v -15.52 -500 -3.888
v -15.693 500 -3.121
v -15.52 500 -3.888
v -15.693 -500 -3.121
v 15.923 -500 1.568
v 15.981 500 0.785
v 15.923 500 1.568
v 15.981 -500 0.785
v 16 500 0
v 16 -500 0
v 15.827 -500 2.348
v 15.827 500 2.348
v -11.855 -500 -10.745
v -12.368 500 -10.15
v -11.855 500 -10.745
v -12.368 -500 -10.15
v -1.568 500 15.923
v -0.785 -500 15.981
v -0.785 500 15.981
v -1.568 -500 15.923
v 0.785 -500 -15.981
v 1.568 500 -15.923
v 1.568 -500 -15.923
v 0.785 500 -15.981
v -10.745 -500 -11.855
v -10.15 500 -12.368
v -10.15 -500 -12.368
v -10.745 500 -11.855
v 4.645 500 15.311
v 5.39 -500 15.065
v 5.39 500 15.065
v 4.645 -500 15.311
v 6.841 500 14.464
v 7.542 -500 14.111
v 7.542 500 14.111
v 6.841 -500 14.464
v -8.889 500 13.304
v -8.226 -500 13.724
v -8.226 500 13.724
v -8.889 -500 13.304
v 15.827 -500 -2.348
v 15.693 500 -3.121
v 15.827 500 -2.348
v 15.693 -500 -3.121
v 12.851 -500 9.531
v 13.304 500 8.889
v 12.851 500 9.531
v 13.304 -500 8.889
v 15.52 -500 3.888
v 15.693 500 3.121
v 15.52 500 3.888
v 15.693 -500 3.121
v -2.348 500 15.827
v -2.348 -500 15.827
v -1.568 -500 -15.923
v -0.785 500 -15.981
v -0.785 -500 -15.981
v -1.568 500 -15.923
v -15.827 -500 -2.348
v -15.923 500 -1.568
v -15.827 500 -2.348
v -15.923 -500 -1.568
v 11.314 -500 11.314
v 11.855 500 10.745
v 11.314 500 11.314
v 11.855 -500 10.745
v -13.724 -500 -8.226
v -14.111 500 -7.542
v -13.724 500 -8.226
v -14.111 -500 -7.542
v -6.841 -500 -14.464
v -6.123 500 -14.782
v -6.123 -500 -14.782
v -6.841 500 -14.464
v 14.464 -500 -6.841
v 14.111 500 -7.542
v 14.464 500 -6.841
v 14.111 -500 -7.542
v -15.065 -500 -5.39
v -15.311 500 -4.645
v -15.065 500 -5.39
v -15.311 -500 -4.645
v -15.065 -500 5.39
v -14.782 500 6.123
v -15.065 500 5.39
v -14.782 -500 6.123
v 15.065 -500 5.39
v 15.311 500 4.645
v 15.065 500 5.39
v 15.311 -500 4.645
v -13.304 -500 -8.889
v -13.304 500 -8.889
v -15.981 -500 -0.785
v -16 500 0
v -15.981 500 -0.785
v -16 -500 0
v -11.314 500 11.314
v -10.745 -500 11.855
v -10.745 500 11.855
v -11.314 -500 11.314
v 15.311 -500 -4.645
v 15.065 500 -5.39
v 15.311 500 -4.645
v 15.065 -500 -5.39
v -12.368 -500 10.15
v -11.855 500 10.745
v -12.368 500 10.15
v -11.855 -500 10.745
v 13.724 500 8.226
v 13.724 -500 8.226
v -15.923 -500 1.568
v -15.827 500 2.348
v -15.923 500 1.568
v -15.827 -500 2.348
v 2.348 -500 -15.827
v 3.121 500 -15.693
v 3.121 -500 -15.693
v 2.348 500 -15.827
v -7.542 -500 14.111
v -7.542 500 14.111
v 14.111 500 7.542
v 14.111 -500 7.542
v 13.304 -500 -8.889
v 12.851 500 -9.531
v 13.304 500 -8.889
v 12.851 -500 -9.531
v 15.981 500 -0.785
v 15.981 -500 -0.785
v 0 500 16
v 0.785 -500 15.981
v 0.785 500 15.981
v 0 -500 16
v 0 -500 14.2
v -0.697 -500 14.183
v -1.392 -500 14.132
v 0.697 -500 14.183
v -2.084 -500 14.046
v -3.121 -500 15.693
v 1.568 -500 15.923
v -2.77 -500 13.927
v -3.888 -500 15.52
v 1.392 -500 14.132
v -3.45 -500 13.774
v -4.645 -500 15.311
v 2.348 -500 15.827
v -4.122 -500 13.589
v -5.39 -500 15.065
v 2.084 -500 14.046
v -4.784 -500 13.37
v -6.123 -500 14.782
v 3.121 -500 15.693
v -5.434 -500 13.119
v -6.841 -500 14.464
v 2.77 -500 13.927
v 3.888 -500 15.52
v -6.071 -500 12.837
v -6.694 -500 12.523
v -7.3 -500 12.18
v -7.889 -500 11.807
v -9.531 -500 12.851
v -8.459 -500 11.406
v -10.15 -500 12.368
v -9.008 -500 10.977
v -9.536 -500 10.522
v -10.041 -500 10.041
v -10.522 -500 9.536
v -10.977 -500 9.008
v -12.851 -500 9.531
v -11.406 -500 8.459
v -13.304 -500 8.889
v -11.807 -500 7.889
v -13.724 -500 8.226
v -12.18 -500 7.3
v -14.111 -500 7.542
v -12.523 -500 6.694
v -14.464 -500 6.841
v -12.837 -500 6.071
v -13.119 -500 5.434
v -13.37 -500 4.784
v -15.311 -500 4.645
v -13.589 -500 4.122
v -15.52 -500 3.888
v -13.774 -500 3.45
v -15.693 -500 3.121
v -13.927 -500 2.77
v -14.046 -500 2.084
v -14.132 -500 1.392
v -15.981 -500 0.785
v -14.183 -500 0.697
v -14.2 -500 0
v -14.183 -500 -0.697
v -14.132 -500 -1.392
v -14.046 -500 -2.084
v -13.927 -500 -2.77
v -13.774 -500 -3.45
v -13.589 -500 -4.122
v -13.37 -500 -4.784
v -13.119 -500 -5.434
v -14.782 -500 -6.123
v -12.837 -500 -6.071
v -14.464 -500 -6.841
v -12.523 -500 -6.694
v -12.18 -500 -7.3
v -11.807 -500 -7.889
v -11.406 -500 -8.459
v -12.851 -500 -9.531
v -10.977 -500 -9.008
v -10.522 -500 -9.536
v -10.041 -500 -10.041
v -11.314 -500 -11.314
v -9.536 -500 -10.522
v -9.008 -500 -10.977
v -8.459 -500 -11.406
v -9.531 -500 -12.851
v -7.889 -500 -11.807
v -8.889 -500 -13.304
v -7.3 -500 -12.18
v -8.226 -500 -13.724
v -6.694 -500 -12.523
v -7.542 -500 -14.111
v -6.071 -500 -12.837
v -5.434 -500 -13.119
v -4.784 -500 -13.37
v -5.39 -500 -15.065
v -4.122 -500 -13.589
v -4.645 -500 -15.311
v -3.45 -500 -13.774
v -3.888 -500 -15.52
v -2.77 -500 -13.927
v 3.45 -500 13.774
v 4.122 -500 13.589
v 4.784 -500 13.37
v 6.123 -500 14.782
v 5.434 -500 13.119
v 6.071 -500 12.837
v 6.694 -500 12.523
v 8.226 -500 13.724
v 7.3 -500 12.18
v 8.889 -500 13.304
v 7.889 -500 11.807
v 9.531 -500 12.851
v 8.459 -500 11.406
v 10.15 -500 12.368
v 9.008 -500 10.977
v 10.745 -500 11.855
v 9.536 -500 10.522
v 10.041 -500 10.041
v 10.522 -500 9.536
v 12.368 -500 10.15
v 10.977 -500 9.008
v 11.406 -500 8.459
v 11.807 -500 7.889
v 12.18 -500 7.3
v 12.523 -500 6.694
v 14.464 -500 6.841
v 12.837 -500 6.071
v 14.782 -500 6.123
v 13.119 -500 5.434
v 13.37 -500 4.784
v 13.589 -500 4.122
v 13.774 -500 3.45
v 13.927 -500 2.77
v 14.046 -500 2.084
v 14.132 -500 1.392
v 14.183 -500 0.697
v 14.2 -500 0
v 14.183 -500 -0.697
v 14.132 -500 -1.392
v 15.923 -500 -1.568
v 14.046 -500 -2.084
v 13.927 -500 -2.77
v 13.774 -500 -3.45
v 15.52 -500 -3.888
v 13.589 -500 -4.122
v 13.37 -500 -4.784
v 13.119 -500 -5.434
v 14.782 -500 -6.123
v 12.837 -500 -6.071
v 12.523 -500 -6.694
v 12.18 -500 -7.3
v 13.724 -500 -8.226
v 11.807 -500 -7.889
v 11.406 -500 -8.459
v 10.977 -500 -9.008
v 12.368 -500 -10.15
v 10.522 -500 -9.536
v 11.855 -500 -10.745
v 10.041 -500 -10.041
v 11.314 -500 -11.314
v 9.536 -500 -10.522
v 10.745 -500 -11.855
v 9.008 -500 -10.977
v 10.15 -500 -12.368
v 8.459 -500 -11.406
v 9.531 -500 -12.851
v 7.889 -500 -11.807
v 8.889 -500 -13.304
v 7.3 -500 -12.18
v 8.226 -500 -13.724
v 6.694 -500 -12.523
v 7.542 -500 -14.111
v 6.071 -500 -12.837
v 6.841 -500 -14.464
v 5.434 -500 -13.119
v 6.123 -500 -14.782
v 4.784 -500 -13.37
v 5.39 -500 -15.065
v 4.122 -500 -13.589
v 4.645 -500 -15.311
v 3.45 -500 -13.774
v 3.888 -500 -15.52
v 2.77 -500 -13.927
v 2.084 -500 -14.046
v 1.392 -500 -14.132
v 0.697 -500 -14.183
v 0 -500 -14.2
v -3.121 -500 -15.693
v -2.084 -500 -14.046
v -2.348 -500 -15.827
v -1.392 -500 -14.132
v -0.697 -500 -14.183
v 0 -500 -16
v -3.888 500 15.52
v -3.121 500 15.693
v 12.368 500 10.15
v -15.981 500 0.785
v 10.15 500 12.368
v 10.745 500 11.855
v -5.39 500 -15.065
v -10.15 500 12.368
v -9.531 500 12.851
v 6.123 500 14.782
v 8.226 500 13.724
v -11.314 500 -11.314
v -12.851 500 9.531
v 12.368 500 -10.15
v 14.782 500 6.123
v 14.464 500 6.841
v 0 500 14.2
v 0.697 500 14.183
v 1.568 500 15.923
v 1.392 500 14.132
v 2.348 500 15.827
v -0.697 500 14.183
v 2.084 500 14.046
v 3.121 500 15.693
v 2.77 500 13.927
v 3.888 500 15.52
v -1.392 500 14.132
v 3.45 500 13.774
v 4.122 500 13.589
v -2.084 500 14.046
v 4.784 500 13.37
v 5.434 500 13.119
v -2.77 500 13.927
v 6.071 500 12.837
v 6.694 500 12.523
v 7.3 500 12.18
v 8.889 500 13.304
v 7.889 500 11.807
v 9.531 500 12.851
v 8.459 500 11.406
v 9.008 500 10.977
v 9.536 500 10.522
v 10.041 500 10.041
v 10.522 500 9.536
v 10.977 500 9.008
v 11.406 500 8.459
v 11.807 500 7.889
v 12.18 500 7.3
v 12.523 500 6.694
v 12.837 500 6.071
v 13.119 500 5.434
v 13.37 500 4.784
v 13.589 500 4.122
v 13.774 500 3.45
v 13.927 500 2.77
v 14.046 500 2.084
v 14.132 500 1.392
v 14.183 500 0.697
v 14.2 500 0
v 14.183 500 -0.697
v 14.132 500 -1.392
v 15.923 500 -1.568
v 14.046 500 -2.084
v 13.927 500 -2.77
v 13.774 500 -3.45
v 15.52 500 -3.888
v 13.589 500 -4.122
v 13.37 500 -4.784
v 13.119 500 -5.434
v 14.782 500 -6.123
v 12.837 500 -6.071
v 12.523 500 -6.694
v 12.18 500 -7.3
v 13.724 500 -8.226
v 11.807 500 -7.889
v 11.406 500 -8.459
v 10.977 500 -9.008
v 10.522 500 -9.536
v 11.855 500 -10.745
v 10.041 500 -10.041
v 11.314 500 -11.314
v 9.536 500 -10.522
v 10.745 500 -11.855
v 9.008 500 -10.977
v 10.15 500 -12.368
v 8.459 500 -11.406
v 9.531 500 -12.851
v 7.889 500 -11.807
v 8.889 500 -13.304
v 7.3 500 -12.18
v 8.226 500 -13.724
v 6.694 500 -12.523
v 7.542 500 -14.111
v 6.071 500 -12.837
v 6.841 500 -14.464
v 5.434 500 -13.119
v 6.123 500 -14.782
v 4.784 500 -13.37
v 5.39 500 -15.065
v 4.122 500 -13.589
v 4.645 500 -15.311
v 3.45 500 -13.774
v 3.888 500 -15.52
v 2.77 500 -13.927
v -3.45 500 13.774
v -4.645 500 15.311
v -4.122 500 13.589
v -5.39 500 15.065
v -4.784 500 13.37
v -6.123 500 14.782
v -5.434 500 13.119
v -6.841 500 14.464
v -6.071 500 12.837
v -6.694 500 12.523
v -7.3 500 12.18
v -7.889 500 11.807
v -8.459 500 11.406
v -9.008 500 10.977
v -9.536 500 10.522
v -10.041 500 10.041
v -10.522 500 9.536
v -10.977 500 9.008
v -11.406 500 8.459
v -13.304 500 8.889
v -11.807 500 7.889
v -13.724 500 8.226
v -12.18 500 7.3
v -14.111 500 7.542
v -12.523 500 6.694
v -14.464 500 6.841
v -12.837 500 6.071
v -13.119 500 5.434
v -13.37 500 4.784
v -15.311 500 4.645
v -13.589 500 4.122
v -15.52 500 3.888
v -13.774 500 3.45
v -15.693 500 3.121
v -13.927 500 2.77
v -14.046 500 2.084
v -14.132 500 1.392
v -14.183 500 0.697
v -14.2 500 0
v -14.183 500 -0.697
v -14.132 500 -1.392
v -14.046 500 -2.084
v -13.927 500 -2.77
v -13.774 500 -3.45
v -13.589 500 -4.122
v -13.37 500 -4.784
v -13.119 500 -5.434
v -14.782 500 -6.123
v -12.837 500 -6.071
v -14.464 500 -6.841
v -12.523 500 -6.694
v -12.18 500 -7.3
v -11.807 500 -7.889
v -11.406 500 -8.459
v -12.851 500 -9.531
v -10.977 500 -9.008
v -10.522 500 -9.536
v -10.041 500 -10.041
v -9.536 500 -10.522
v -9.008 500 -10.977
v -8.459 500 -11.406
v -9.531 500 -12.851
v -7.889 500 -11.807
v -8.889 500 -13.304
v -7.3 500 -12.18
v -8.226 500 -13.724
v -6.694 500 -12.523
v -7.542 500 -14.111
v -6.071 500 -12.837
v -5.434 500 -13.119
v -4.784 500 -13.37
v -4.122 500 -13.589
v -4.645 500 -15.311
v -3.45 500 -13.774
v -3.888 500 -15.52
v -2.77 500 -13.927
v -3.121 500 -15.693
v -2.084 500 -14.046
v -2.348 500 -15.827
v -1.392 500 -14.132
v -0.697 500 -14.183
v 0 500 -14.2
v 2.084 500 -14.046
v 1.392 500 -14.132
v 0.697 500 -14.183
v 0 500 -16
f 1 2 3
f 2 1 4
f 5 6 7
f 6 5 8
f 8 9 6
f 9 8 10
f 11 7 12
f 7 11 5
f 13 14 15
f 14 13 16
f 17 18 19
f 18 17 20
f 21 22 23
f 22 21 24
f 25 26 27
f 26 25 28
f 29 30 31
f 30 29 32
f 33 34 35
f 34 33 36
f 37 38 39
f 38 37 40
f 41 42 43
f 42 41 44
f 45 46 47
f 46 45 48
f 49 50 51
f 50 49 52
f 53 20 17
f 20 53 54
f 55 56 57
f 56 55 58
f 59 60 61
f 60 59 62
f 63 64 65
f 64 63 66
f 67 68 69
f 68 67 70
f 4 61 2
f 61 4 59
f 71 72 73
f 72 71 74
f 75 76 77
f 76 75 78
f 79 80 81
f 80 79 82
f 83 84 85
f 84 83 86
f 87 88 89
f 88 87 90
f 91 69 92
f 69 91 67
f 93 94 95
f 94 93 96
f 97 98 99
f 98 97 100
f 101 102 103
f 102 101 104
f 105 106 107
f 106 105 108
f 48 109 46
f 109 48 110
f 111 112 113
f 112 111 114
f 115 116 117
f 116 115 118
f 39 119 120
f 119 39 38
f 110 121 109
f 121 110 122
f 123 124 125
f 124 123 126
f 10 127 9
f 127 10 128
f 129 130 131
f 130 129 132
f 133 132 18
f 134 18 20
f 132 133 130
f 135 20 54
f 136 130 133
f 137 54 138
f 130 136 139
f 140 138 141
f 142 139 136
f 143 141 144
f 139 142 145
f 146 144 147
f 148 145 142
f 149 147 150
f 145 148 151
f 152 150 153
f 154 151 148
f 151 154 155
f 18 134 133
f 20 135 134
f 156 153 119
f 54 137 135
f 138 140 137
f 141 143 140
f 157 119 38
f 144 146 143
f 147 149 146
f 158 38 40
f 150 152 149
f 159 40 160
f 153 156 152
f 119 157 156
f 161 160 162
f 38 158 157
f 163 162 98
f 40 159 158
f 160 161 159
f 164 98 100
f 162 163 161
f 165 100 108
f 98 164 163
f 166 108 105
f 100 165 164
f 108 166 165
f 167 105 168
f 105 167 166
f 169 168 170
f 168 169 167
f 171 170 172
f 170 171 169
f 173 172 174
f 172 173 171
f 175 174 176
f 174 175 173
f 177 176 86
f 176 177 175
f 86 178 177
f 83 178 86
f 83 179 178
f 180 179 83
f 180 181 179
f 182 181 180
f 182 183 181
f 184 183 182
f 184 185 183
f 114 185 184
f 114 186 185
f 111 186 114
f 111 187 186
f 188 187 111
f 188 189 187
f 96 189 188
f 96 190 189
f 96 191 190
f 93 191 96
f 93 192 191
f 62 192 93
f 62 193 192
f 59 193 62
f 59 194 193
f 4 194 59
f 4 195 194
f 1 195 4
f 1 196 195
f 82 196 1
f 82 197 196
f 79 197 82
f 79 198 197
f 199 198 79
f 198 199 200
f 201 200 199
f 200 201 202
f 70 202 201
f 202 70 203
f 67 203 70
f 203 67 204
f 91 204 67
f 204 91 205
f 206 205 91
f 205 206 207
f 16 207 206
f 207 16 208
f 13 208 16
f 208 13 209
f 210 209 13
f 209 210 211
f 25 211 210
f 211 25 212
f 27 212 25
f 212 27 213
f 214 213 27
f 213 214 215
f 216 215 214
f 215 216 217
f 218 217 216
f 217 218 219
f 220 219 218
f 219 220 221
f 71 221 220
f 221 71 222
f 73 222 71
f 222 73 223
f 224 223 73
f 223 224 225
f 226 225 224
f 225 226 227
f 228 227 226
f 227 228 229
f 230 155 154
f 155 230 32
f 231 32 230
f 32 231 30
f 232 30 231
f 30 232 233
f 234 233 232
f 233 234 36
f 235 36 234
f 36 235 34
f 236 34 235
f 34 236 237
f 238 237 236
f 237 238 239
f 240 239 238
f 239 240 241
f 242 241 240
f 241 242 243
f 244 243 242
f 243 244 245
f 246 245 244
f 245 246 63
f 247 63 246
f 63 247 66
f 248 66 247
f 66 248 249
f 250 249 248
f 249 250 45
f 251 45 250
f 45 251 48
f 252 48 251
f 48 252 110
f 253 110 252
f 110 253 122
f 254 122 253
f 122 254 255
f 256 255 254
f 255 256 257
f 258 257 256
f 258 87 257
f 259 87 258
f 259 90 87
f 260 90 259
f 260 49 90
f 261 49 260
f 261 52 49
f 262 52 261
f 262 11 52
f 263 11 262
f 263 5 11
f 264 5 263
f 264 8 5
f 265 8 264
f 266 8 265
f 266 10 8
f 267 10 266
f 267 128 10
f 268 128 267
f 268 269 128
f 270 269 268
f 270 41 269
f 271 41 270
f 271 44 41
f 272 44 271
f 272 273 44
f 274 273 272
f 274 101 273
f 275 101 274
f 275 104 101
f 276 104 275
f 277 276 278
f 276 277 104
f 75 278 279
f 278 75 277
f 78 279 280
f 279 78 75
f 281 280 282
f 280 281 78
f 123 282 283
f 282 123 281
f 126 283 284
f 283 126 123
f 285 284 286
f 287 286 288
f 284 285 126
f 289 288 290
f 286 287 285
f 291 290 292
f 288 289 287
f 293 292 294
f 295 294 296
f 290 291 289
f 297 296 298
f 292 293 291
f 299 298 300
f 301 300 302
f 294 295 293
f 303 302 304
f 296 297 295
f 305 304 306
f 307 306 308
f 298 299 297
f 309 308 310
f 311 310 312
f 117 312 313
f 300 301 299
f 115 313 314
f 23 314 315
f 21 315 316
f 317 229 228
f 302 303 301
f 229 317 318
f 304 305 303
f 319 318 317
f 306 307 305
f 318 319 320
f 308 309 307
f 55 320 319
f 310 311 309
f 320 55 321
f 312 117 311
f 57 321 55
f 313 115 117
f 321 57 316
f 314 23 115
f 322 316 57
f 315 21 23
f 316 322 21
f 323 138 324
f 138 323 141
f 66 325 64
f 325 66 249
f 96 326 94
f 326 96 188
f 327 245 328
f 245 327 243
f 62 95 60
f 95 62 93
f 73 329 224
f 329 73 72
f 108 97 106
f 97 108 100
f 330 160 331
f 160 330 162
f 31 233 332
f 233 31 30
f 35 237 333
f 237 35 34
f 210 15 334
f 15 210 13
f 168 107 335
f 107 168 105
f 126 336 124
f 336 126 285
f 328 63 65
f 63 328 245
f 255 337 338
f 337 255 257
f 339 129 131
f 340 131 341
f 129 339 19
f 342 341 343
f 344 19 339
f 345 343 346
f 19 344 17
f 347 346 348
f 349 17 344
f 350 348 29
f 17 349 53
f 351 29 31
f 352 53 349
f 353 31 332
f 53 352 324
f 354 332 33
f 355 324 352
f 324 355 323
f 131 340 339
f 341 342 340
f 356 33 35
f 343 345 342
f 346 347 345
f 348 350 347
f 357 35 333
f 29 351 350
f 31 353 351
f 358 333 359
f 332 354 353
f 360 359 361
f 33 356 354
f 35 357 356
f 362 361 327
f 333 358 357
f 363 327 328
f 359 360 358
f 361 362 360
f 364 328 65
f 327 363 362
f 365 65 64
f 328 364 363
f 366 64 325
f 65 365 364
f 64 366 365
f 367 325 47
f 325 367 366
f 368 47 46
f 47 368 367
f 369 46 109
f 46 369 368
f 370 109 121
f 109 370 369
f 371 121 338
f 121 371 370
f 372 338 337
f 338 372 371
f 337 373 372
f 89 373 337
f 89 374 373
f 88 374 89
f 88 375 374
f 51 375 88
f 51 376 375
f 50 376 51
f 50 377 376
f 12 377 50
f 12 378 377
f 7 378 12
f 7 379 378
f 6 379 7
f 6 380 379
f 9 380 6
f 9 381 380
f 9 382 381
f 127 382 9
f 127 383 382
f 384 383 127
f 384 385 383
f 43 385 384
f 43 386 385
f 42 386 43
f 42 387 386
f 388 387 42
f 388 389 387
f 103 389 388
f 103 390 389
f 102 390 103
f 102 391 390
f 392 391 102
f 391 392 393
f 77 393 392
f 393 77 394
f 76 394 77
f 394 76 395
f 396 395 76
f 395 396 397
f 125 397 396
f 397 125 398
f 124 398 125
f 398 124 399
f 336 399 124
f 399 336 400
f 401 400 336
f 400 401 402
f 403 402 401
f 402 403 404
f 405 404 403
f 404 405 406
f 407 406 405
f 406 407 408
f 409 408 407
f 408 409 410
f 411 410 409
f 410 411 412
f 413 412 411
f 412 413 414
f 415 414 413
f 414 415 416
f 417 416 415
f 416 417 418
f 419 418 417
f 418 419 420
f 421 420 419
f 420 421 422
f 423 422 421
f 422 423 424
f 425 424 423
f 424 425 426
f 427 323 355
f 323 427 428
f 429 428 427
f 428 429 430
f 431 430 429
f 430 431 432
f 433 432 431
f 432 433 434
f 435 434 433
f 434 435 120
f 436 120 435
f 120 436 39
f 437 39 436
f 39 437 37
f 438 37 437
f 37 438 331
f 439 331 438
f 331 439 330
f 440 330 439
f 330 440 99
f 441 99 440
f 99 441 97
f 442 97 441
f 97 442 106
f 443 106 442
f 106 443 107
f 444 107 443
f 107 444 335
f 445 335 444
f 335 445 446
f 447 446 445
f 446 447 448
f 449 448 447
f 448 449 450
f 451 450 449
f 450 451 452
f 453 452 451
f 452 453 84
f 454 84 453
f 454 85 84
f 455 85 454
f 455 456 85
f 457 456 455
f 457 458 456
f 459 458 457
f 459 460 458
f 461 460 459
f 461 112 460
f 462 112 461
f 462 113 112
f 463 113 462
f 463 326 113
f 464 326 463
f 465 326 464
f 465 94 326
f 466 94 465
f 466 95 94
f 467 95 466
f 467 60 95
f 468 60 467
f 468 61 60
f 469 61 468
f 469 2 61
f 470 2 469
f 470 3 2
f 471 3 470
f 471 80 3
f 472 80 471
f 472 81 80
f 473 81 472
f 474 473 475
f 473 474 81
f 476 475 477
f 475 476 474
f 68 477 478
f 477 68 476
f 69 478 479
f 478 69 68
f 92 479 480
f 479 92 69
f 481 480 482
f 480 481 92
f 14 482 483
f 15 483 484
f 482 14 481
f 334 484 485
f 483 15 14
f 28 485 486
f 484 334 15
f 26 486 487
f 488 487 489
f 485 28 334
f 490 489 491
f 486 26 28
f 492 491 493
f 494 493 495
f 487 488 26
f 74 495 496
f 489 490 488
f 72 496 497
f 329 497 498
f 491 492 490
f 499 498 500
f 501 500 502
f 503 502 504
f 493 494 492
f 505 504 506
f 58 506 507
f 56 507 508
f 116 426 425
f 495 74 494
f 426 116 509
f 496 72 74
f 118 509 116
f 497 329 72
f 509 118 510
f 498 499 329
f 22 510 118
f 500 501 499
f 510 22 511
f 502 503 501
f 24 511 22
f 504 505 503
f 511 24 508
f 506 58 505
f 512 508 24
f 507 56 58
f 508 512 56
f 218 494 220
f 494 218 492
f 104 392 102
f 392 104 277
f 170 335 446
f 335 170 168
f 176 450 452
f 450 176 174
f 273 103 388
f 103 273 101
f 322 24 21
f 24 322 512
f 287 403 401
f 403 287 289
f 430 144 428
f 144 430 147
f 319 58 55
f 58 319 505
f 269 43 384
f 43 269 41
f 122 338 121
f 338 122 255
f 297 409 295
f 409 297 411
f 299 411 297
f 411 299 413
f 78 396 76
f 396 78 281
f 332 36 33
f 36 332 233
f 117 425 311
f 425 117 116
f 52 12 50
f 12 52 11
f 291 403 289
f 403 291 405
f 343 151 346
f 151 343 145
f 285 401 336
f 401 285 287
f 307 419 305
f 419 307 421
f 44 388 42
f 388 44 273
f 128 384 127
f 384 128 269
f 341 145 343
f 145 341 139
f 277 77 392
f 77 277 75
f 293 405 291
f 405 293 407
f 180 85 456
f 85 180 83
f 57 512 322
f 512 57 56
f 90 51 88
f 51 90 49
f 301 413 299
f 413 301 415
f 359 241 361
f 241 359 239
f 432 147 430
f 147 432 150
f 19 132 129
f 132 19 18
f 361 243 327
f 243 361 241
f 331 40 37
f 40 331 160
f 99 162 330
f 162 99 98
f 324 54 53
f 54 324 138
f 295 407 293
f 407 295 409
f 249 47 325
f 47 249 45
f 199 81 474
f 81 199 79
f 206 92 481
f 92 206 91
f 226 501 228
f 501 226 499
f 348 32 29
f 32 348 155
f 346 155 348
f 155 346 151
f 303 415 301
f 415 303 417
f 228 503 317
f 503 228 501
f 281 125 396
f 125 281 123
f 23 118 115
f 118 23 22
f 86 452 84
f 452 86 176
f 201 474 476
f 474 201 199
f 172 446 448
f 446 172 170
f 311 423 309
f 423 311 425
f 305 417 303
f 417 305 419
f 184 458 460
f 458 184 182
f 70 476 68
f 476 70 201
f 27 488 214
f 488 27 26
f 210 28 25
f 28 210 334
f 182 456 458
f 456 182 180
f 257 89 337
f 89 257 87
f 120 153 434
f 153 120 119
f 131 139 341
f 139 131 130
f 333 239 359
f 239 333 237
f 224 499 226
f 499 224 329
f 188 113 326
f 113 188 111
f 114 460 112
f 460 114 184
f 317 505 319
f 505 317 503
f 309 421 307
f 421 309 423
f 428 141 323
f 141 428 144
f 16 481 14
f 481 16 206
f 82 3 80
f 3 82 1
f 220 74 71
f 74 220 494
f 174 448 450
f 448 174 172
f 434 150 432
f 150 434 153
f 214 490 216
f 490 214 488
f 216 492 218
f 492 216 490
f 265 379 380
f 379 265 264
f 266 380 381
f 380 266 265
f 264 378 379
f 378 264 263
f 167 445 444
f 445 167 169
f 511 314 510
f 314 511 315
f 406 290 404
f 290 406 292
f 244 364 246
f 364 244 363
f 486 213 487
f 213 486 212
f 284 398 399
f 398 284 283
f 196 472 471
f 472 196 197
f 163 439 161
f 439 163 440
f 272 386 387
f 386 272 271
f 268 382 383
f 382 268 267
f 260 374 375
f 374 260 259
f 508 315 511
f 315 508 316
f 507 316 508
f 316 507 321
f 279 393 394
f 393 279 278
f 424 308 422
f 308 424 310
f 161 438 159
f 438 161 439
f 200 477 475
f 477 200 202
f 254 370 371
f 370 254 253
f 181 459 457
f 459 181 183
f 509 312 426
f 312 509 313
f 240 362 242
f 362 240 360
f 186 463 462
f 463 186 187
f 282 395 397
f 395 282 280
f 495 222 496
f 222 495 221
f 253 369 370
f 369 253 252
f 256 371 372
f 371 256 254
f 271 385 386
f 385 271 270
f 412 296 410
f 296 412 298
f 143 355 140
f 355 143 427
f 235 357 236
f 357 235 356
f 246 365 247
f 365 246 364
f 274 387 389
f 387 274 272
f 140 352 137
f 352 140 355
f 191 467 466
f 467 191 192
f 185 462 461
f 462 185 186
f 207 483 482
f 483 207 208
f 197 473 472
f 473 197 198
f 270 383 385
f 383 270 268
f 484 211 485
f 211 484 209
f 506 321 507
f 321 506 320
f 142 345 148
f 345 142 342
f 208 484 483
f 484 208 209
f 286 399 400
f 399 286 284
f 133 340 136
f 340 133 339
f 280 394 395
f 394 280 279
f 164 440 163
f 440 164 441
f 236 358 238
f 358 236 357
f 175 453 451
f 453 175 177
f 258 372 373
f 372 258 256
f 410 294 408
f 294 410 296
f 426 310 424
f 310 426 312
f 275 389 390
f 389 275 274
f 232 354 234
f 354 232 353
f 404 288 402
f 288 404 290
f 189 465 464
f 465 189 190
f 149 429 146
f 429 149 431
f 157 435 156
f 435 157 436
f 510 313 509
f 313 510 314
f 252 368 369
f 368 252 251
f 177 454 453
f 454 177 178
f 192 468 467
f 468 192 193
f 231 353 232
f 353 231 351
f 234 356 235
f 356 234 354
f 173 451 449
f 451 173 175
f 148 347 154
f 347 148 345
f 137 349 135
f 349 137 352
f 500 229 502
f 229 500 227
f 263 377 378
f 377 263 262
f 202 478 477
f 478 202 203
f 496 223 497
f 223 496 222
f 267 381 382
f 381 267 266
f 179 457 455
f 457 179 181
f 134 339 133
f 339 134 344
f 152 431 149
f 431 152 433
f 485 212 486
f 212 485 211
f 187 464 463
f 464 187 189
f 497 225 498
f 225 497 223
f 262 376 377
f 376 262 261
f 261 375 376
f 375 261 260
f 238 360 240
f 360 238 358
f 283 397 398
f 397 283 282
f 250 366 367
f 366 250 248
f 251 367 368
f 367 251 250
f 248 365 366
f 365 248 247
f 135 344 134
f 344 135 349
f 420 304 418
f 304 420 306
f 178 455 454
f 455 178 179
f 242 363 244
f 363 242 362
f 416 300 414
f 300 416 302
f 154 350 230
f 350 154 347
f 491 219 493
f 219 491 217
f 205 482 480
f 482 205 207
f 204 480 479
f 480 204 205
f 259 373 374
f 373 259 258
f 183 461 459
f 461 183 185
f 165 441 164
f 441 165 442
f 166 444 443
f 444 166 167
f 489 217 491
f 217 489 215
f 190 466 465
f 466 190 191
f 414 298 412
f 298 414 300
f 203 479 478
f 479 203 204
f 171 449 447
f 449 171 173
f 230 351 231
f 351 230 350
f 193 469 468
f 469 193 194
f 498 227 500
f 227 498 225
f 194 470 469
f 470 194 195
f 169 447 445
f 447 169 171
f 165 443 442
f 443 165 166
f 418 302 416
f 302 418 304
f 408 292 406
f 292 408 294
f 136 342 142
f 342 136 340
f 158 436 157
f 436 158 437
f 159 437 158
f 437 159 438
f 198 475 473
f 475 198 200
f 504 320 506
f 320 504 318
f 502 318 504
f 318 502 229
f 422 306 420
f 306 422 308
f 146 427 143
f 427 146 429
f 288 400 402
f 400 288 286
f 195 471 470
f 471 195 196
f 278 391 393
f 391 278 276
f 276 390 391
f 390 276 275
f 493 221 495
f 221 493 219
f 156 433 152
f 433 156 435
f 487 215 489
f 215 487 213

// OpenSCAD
$fn = 128;

// HT 32 pipe (approx.): OD 32 mm, wall 1.8 mm, length 1000 mm
od = 32;
wall = 1.8;
id = od - 2*wall;
len = 1000;

eps = 0.2;

rotate([90, 0, 0])  // lay pipe along X so orthographic views show length clearly
difference() {
    cylinder(h = len, d = od, center = true);
    cylinder(h = len + 2*eps, d = id, center = true);
}
